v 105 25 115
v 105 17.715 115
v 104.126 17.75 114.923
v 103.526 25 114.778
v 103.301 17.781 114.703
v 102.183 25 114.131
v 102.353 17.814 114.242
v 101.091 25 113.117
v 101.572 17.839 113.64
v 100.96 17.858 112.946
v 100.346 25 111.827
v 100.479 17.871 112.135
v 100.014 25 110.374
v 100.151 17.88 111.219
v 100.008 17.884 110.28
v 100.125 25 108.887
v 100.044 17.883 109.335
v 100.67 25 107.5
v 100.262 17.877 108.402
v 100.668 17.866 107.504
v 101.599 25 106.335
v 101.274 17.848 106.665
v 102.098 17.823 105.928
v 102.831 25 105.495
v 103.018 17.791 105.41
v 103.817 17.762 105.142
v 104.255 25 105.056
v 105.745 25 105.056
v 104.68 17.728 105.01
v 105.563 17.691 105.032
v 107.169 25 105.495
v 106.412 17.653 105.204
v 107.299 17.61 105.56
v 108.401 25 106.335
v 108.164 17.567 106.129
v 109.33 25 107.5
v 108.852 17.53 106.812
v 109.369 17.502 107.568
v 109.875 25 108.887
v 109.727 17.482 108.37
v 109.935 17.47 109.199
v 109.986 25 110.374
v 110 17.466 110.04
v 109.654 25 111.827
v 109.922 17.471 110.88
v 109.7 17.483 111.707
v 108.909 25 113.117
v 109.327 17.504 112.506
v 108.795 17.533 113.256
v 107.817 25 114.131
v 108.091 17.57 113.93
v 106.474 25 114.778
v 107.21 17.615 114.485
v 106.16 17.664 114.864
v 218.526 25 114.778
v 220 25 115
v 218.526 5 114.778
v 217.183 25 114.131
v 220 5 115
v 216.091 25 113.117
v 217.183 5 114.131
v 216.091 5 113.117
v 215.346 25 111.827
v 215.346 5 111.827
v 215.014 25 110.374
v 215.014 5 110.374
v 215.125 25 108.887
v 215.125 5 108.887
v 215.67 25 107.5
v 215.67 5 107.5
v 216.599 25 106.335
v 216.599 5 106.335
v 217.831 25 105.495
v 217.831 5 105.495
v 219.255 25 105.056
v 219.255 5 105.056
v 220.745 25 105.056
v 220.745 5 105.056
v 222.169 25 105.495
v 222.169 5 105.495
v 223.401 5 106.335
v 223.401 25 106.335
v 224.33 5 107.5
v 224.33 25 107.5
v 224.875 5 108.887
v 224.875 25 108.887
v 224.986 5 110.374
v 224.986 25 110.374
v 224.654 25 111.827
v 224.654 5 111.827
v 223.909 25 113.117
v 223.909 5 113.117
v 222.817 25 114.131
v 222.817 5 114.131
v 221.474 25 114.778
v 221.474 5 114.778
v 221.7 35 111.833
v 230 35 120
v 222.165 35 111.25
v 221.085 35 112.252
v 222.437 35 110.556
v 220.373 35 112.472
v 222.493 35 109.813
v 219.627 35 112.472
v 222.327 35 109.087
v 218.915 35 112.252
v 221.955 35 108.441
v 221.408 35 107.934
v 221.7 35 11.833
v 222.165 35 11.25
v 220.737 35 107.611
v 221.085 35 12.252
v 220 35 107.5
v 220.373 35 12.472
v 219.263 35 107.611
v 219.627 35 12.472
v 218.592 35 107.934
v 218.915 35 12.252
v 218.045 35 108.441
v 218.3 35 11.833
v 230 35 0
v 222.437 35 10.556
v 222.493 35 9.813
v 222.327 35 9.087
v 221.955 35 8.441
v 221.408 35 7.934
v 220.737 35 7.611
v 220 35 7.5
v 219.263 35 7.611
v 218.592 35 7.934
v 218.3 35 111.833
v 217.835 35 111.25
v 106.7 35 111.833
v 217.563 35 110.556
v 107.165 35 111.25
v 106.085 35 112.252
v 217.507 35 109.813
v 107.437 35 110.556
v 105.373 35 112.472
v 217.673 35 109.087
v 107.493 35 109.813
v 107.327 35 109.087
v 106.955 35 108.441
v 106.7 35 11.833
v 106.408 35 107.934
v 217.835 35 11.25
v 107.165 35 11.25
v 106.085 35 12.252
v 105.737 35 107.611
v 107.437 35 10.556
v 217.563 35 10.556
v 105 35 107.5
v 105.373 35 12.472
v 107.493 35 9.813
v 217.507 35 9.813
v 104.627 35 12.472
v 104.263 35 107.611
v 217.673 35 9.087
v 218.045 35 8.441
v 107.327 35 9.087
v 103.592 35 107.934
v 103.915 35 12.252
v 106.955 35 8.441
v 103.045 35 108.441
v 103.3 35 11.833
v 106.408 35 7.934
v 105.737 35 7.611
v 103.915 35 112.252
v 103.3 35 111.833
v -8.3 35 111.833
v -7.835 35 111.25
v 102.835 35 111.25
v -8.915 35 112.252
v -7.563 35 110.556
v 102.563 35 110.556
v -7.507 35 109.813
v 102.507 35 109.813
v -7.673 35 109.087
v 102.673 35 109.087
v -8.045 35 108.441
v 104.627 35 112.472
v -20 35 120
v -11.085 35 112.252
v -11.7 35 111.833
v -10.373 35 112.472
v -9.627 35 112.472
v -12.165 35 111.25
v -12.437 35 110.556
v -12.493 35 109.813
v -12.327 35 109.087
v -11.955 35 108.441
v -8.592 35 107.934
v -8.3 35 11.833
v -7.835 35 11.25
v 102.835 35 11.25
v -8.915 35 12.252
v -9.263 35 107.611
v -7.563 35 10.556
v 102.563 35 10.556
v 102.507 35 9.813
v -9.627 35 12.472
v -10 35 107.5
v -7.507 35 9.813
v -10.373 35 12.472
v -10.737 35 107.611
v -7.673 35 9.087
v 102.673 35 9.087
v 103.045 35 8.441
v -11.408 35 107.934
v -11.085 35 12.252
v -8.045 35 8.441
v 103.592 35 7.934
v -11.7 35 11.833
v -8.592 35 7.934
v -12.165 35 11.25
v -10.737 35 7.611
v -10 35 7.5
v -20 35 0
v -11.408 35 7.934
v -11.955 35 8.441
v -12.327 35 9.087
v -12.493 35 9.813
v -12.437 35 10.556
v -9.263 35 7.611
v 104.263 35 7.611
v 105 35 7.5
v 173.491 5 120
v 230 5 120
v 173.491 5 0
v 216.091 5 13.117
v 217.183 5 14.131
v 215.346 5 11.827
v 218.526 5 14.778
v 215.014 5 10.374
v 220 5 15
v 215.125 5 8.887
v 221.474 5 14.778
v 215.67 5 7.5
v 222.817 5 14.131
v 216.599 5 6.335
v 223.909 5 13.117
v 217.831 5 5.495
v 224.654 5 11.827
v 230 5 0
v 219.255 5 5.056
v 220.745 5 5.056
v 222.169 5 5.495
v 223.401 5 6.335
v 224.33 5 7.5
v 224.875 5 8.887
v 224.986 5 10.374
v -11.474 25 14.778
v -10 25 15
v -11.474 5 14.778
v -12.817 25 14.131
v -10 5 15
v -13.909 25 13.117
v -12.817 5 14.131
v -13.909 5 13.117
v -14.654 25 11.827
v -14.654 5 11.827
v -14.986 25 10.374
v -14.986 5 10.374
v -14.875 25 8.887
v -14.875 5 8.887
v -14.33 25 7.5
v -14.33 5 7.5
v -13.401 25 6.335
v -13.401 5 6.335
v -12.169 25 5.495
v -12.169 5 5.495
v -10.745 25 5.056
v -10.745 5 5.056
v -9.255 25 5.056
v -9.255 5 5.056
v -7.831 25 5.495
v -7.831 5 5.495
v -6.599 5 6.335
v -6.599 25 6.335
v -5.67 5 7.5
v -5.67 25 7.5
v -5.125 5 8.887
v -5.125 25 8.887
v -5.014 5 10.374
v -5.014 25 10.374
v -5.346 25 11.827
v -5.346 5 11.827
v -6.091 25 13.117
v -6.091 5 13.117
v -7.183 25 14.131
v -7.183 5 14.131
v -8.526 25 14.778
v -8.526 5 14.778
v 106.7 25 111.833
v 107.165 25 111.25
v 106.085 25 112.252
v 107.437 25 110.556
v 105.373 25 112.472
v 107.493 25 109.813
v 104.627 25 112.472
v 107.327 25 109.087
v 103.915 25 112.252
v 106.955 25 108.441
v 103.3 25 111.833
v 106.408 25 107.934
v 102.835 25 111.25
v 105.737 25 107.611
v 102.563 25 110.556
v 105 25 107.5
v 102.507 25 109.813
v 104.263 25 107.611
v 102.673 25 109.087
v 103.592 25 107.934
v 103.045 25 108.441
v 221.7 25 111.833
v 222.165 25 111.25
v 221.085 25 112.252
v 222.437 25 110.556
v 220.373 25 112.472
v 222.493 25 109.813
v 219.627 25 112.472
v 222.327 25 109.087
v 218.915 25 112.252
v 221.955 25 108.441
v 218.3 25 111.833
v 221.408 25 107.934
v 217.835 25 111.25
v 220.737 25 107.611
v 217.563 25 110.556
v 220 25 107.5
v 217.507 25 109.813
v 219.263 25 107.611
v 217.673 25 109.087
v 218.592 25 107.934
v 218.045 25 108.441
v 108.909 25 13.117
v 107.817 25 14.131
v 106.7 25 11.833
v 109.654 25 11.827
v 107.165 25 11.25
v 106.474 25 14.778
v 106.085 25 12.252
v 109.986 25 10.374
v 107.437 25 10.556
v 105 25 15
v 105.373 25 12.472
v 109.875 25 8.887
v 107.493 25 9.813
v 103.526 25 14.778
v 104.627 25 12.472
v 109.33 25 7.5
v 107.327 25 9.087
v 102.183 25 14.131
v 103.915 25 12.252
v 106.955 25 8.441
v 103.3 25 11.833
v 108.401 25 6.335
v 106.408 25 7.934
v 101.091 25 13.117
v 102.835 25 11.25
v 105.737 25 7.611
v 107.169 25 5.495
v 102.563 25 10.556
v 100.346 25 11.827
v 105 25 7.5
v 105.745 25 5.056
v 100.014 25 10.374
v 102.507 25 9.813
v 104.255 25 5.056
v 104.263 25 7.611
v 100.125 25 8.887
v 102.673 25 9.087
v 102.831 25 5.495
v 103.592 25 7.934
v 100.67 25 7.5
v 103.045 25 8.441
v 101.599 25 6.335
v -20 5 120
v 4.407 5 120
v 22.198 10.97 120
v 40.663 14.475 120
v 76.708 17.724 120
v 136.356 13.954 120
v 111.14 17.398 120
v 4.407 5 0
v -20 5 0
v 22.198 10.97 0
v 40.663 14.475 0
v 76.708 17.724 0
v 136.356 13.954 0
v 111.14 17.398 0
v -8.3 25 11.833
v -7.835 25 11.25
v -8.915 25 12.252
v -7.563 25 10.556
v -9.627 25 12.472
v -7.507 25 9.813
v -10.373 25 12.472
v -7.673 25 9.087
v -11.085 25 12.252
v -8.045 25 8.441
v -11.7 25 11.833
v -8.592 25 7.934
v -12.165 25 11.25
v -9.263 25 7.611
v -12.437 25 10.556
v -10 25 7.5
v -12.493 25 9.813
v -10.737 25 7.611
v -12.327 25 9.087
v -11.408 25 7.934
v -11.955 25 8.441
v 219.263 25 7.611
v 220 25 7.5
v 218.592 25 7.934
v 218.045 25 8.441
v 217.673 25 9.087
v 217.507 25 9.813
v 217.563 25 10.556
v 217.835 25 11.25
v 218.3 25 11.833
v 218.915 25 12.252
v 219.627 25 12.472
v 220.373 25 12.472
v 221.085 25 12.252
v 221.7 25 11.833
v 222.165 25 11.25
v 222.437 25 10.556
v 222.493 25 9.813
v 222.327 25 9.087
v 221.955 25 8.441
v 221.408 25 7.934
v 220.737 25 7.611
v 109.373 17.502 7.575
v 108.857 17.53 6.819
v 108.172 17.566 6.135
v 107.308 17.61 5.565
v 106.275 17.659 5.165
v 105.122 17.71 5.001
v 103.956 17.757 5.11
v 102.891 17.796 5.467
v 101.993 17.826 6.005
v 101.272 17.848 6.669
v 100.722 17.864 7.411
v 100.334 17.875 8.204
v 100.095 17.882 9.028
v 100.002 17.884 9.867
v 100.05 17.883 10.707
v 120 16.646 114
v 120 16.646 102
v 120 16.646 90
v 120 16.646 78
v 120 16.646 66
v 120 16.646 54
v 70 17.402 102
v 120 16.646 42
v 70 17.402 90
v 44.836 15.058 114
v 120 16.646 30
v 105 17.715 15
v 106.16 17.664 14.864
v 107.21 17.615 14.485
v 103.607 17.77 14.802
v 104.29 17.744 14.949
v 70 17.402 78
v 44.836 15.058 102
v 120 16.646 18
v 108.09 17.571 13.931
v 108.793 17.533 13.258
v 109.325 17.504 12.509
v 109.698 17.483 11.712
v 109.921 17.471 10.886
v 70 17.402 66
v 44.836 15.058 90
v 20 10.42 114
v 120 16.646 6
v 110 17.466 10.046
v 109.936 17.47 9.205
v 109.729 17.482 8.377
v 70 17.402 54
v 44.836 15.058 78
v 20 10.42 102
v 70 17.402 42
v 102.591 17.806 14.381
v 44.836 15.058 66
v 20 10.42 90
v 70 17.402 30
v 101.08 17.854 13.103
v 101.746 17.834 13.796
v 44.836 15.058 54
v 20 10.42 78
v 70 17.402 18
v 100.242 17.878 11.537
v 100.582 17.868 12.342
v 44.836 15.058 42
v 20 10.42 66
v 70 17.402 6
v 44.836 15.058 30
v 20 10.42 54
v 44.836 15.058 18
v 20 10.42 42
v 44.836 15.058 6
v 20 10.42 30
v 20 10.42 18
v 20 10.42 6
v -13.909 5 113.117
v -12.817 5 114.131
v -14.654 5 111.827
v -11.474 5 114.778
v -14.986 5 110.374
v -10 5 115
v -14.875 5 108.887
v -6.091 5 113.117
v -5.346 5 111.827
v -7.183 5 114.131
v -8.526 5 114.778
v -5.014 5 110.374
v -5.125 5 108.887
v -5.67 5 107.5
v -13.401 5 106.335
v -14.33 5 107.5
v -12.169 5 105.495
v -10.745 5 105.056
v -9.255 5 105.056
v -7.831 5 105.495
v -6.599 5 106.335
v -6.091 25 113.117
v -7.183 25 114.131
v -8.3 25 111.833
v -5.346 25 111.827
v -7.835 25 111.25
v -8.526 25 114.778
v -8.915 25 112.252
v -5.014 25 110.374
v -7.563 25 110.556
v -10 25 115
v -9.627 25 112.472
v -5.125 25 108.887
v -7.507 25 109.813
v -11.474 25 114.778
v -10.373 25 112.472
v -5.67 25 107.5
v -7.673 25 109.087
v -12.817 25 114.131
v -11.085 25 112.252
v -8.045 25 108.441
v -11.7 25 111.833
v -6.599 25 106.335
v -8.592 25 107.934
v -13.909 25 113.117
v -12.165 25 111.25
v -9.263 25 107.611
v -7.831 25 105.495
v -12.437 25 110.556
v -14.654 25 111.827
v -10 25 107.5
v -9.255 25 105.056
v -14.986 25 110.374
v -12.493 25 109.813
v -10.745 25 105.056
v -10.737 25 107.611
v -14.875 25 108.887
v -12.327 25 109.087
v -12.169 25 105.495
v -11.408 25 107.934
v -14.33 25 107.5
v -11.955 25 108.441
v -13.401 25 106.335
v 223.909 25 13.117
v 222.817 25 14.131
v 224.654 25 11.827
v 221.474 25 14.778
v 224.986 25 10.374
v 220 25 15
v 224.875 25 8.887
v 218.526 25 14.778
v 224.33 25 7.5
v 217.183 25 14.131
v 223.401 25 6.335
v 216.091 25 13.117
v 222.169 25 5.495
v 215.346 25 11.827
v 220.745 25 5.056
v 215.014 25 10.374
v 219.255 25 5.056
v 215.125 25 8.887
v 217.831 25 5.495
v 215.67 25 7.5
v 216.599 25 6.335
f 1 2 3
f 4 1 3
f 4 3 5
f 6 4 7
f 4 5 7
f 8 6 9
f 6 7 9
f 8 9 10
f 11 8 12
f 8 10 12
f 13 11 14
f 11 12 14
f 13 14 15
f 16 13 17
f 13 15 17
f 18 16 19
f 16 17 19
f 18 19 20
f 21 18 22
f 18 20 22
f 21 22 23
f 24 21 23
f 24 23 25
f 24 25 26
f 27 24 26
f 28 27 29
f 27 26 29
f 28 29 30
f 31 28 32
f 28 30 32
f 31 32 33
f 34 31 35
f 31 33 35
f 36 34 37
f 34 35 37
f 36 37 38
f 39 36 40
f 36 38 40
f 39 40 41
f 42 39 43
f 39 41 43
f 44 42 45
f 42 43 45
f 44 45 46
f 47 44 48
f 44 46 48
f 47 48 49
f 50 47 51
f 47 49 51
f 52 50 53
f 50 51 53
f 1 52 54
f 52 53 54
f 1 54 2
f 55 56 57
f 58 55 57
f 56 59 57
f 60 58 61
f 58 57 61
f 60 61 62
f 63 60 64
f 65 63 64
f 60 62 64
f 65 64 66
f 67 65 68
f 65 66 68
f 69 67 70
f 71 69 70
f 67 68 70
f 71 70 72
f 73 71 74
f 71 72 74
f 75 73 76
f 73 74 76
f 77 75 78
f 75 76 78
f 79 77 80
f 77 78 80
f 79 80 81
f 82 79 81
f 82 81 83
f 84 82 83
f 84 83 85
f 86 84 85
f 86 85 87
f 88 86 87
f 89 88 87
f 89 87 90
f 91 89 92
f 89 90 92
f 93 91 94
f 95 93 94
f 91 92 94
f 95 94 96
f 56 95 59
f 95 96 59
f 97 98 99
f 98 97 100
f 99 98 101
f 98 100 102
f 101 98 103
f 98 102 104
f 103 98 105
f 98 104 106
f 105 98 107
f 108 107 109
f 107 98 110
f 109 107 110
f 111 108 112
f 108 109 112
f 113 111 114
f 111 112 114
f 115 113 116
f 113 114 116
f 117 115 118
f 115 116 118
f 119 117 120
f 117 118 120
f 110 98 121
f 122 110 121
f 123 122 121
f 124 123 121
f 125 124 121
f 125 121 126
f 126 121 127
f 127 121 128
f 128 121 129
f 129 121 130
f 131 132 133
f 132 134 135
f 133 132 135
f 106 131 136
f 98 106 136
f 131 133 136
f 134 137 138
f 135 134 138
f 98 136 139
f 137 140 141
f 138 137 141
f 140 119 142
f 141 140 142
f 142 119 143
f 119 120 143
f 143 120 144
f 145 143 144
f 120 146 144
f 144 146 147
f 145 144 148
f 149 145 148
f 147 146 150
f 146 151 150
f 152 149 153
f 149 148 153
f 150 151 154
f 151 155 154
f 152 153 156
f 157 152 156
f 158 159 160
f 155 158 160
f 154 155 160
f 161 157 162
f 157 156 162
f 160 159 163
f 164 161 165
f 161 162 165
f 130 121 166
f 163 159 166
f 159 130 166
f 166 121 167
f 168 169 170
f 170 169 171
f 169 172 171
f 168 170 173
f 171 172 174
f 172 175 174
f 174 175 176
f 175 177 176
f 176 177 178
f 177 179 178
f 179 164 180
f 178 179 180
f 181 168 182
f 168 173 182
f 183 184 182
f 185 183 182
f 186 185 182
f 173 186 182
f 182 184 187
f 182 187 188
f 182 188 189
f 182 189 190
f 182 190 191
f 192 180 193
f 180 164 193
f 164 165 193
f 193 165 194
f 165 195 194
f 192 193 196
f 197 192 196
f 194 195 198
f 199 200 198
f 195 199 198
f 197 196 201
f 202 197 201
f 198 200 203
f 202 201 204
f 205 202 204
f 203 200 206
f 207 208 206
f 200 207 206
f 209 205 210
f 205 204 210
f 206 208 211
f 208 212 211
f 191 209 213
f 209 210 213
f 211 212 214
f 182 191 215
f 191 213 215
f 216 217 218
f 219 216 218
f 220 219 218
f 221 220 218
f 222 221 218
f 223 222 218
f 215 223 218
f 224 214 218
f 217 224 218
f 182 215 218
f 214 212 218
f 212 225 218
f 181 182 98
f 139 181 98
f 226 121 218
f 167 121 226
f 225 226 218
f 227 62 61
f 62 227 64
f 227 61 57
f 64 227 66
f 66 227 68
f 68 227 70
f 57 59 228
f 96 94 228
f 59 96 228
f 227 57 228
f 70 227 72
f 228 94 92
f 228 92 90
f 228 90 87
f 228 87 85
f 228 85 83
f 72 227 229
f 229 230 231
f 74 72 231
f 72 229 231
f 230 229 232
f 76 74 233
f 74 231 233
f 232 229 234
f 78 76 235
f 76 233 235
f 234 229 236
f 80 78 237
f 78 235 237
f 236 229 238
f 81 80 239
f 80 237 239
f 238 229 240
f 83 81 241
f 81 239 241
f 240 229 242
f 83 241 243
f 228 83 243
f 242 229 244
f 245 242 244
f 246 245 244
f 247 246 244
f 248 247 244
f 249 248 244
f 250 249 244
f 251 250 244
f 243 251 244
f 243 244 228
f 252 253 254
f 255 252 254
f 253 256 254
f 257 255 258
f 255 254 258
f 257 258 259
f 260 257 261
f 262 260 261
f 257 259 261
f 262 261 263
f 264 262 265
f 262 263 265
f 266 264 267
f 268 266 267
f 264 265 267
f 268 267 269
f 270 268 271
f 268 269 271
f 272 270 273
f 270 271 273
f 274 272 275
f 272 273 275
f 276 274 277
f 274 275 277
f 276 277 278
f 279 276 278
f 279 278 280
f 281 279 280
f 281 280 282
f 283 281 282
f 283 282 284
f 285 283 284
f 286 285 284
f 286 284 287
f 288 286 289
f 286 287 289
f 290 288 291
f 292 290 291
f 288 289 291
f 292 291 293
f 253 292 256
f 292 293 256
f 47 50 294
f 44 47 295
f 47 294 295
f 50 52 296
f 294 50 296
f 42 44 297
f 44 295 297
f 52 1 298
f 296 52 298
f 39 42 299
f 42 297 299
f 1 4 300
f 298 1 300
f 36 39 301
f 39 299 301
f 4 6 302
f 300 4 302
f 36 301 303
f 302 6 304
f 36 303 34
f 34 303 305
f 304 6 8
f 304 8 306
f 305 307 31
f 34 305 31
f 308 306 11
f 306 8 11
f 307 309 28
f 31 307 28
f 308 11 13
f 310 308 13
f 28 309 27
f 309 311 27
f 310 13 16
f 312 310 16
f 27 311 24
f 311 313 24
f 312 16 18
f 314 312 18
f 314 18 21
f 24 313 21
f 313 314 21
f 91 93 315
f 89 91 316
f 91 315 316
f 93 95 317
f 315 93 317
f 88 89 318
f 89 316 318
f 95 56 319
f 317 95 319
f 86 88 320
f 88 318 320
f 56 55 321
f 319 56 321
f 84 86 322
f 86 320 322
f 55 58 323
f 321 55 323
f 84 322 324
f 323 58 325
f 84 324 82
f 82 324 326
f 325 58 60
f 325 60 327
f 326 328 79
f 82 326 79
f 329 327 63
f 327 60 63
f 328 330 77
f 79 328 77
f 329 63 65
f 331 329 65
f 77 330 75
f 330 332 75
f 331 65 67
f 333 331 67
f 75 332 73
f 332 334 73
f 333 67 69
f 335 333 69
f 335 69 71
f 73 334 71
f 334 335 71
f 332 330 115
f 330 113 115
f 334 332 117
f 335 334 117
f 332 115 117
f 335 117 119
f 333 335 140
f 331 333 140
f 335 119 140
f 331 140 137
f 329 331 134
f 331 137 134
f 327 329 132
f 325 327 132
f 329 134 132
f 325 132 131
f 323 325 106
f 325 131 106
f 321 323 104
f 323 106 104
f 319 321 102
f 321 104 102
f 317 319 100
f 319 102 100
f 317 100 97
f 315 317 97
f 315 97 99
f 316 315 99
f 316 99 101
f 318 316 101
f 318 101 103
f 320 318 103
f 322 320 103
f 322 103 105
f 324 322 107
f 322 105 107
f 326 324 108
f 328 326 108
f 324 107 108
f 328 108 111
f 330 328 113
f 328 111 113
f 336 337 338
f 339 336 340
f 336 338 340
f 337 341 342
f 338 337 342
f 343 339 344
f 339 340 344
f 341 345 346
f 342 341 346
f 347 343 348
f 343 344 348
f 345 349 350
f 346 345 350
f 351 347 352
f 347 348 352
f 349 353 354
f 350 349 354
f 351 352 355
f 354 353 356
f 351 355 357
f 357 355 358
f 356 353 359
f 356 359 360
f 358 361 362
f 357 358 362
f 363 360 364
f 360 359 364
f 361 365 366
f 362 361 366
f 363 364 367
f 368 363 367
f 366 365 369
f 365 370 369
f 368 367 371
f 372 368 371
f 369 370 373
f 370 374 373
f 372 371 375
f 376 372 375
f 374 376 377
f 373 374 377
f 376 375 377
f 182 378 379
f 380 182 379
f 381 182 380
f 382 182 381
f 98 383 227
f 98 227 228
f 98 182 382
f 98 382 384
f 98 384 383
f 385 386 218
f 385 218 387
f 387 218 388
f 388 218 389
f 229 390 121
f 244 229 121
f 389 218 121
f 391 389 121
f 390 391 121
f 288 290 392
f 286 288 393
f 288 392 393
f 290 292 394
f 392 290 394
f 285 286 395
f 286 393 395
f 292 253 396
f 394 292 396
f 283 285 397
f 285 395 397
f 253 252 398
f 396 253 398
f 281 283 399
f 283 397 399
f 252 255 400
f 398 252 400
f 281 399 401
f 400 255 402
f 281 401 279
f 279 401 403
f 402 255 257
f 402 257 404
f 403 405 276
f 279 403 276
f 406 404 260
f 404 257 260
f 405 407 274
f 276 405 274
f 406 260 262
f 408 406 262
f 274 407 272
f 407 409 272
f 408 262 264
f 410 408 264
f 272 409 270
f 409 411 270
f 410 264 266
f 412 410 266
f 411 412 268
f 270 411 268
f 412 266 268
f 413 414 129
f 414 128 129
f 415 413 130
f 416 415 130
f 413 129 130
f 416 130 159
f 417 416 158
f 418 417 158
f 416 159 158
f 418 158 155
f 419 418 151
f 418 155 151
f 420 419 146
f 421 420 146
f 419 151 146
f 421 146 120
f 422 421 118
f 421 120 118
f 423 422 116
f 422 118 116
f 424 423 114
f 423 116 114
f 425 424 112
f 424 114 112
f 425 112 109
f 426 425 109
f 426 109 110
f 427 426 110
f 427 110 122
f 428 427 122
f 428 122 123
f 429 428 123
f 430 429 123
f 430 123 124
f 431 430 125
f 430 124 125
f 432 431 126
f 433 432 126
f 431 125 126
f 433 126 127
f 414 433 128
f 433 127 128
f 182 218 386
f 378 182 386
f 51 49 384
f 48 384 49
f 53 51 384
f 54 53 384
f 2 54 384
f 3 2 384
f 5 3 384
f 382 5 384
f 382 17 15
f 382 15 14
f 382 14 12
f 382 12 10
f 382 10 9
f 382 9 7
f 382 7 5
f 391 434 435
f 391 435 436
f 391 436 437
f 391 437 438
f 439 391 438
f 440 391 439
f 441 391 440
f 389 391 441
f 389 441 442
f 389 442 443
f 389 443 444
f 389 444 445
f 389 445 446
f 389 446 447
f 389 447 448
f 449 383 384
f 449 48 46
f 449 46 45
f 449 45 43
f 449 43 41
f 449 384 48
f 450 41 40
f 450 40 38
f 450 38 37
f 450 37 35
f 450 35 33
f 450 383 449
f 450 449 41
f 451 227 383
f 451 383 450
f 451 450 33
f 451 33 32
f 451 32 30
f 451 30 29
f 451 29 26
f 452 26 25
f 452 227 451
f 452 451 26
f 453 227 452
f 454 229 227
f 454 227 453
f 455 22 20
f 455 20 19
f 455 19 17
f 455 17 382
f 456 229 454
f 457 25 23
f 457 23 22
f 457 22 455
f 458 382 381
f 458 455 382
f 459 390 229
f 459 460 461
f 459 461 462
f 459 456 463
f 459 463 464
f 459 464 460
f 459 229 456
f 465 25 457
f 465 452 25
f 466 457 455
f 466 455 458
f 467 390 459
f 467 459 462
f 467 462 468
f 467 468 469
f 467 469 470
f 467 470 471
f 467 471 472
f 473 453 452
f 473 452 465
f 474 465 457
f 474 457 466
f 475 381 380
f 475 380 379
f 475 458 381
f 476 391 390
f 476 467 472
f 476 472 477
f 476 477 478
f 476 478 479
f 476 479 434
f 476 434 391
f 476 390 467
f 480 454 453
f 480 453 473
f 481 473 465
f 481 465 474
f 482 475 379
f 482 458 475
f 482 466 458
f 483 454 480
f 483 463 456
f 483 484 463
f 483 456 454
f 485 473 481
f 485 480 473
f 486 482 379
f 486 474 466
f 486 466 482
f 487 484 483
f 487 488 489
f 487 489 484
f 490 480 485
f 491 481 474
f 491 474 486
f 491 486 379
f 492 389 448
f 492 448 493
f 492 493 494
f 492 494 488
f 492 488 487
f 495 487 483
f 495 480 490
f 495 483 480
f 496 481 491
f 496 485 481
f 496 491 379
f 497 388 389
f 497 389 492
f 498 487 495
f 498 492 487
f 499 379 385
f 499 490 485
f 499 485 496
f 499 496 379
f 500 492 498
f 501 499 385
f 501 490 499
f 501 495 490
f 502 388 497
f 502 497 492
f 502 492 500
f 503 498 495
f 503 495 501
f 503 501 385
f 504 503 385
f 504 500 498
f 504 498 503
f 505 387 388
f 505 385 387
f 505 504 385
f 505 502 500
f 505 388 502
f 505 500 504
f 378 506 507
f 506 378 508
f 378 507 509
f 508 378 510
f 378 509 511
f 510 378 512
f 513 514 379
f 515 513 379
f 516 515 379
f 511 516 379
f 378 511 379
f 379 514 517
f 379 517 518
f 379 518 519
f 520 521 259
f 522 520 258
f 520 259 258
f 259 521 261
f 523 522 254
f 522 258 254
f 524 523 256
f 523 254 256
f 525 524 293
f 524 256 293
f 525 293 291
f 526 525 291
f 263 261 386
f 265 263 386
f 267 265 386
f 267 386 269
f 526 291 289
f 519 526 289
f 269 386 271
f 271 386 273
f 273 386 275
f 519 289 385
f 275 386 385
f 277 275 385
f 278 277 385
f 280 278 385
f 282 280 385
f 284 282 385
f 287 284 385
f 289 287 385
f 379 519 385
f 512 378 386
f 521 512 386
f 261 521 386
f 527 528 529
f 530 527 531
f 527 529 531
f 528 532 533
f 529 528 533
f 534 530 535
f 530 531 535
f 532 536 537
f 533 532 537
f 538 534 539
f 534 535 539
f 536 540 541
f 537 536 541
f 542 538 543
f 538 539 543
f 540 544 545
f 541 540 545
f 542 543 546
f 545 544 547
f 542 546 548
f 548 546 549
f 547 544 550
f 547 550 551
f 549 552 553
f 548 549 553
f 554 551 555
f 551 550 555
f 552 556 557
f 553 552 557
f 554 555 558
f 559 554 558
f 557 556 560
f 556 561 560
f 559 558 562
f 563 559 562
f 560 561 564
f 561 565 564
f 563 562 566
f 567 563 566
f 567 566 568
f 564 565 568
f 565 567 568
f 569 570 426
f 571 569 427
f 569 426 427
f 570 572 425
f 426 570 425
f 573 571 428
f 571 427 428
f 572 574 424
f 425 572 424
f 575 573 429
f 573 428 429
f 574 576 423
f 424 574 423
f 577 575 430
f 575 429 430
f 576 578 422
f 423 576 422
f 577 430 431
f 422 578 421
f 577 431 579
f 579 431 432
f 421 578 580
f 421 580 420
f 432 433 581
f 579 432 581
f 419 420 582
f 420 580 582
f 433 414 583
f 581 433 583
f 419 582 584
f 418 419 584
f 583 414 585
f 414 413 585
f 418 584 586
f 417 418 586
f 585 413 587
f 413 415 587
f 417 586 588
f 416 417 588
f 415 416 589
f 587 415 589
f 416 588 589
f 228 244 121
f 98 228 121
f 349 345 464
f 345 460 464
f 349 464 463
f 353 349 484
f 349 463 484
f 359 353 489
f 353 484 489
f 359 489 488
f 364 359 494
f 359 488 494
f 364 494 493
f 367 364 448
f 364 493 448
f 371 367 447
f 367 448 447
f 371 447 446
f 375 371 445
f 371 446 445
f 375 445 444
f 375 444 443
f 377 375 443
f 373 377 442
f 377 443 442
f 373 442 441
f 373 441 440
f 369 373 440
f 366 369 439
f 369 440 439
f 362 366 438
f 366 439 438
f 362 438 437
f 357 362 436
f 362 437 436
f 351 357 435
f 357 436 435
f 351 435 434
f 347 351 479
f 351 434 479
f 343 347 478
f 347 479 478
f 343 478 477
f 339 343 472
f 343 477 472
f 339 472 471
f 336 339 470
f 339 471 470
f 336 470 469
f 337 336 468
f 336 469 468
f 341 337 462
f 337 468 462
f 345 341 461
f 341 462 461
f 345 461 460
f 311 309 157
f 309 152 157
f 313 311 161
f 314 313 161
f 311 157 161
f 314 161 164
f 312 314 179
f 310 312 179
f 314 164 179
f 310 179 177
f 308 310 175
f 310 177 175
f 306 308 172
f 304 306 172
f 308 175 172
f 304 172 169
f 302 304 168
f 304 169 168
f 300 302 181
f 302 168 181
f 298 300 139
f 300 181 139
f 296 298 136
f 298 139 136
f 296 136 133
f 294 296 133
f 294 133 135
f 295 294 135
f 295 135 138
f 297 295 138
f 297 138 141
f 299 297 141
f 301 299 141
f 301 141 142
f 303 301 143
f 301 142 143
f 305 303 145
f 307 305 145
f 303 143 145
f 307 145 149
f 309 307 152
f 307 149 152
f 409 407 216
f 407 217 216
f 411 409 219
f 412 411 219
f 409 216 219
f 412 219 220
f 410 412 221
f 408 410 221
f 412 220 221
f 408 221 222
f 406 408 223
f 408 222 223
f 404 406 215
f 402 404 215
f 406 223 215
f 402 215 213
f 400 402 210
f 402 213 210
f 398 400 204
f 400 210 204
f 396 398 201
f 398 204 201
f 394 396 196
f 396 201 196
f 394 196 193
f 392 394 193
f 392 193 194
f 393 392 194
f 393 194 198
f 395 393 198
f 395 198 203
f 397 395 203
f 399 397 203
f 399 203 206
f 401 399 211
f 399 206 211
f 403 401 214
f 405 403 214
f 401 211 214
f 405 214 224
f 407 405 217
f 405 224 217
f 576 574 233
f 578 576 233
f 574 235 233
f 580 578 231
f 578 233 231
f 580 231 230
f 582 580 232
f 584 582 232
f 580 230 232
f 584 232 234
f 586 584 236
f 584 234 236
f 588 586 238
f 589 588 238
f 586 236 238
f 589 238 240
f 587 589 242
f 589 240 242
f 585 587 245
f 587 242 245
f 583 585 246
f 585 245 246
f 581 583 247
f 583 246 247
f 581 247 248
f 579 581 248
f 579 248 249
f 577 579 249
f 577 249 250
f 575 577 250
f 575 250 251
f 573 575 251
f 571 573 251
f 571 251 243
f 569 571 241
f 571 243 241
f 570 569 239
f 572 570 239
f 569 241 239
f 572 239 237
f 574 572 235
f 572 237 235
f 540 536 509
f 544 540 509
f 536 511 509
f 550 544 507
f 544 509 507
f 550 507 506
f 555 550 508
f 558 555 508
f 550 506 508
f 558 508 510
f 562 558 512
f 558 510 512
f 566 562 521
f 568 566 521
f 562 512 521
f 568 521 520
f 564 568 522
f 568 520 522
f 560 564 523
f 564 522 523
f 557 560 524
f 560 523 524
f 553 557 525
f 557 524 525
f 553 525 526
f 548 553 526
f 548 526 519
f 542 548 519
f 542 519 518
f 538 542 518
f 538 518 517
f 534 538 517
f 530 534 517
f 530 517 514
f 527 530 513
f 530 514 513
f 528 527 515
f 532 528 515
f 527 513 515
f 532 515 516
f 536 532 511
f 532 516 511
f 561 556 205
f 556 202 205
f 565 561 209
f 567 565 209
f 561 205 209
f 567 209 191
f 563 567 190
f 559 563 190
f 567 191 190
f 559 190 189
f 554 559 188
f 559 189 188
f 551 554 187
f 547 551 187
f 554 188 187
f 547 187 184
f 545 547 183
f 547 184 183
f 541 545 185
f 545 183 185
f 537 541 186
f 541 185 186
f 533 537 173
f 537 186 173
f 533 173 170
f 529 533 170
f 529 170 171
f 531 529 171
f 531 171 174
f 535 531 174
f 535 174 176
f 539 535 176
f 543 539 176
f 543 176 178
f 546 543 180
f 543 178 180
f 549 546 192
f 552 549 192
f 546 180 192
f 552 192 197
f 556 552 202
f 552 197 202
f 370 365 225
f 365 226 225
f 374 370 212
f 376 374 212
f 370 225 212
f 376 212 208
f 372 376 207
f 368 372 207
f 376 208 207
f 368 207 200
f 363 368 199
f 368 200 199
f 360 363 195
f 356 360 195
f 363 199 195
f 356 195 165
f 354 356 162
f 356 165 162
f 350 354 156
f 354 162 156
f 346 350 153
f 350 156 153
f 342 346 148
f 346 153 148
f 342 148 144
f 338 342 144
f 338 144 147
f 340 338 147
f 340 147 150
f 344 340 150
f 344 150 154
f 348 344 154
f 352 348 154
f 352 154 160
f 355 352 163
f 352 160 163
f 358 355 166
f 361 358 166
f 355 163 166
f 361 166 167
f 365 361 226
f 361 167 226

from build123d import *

# Parameters (mm, degrees)
BOSS_EXTRUDE1_DEPTH             = 120
SKETCH10_W                      = 2.5
SKETCH10_H                      = 10
F_5_0MM_DOWEL_HOLE1_AT_2_COUNT  = 2
F_5_0MM_DOWEL_HOLE1_AT_2_PITCH  = 230
F_5_0MM_DOWEL_HOLE1_AT_3_COUNT  = 2
F_5_0MM_DOWEL_HOLE1_AT_3_PITCH  = 250.79872408
F_5_0MM_DOWEL_HOLE1_AT_4_COUNT  = 2
F_5_0MM_DOWEL_HOLE1_AT_4_PITCH  = 152.397506541
F_5_0MM_DOWEL_HOLE1_AT_5_COUNT  = 2
F_5_0MM_DOWEL_HOLE1_AT_5_PITCH  = 100
F_5_0MM_DOWEL_HOLE1_AT_6_COUNT  = 2
F_5_0MM_DOWEL_HOLE1_AT_6_PITCH  = 115
SKETCH13_W                      = 5
SKETCH13_H                      = 20
F_10_0MM_DOWEL_HOLE1_AT_2_COUNT = 2
F_10_0MM_DOWEL_HOLE1_AT_2_PITCH = 115
F_10_0MM_DOWEL_HOLE1_AT_3_COUNT = 2
F_10_0MM_DOWEL_HOLE1_AT_3_PITCH = 230
F_10_0MM_DOWEL_HOLE1_AT_4_COUNT = 2
F_10_0MM_DOWEL_HOLE1_AT_4_PITCH = 250.79872408
F_10_0MM_DOWEL_HOLE1_AT_5_COUNT = 2
F_10_0MM_DOWEL_HOLE1_AT_5_PITCH = 152.397506541
F_10_0MM_DOWEL_HOLE1_AT_6_COUNT = 2
F_10_0MM_DOWEL_HOLE1_AT_6_PITCH = 100


with BuildPart() as part:
    # Sketch1 → Boss-Extrude1 (new body)
    with BuildSketch(Plane.XY):
        with BuildLine():
            Line((-20, 5), (4.406999064, 5))
            add(Edge.make_bspline(
                [(173.490575932, 5), (172.326342066, 5.286749118), (167.829693344, 6.405018282), (160.005568623, 8.421384221), (150.022959876, 10.929293239), (140.032690883, 13.242212873), (130.039576349, 15.224534417), (120.039677674, 16.776832577), (110.010328484, 17.519452934), (100.004268105, 17.93606864), (89.999557234, 18.039439262), (79.99597078, 17.88209955), (69.992122817, 17.447369698), (59.98803219, 16.737630926), (49.981633888, 15.747713143), (39.97167458, 14.434248174), (29.95037961, 12.743709227), (21.617032213, 10.901524907), (14.966560888, 9.053828582), (9.928778454, 7.425562721), (6.425978449, 5.993531691), (4.603660534, 5.099329751), (4.406999064, 5)],
                knots=[0.065553478, 0.065553478, 0.065553478, 0.065553478, 0.074294227, 0.099342978, 0.124359733, 0.149264719, 0.174009696, 0.198546974, 0.22290397, 0.247200686, 0.271477726, 0.295756352, 0.320054721, 0.344391349, 0.368786978, 0.393273071, 0.417900952, 0.442781229, 0.455381891, 0.468160436, 0.481314037, 0.482916031, 0.482916031, 0.482916031, 0.482916031], degree=3))
            Line((173.490575932, 5), (230, 5))
            Line((230, 5), (230, 35))
            Line((230, 35), (-20, 35))
            Line((-20, 35), (-20, 5))
        make_face()
    extrude(amount=BOSS_EXTRUDE1_DEPTH)

    # Sketch10 → Ø5.0mm Dowel Hole1 (revolve, cut)
    with BuildSketch(Plane(origin=(-10, 25, 10), x_dir=(0, 0, -1), z_dir=(1, 0, 0))):
        with Locations((1.25, 5)):
            Rectangle(SKETCH10_W, SKETCH10_H)
    f_5_0mm_dowel_hole1 = revolve(axis=Axis((-10, 18.65, 10), (0, 1, 0)), mode=Mode.SUBTRACT)

    # Ø5.0mm Dowel Hole1 at 2: Ø5.0mm Dowel Hole1 ×2
    with Locations(*[(i * F_5_0MM_DOWEL_HOLE1_AT_2_PITCH, 0, 0) for i in range(1, F_5_0MM_DOWEL_HOLE1_AT_2_COUNT)]):
        add(f_5_0mm_dowel_hole1, mode=Mode.SUBTRACT)

    # Ø5.0mm Dowel Hole1 at 3: Ø5.0mm Dowel Hole1 ×2
    with Locations(*[Vector(0.917070056253235, 0, 0.39872611141445) * (i * F_5_0MM_DOWEL_HOLE1_AT_3_PITCH) for i in range(1, F_5_0MM_DOWEL_HOLE1_AT_3_COUNT)]):
        add(f_5_0mm_dowel_hole1, mode=Mode.SUBTRACT)

    # Ø5.0mm Dowel Hole1 at 4: Ø5.0mm Dowel Hole1 ×2
    with Locations(*[Vector(0.7546055221635047, 0, 0.6561787149247866) * (i * F_5_0MM_DOWEL_HOLE1_AT_4_PITCH) for i in range(1, F_5_0MM_DOWEL_HOLE1_AT_4_COUNT)]):
        add(f_5_0mm_dowel_hole1, mode=Mode.SUBTRACT)

    # Ø5.0mm Dowel Hole1 at 5: Ø5.0mm Dowel Hole1 ×2
    with Locations(*[(0, 0, i * F_5_0MM_DOWEL_HOLE1_AT_5_PITCH) for i in range(1, F_5_0MM_DOWEL_HOLE1_AT_5_COUNT)]):
        add(f_5_0mm_dowel_hole1, mode=Mode.SUBTRACT)

    # Ø5.0mm Dowel Hole1 at 6: Ø5.0mm Dowel Hole1 ×2
    with Locations(*[(i * F_5_0MM_DOWEL_HOLE1_AT_6_PITCH, 0, 0) for i in range(1, F_5_0MM_DOWEL_HOLE1_AT_6_COUNT)]):
        add(f_5_0mm_dowel_hole1, mode=Mode.SUBTRACT)

    # Sketch13 → Ø10.0mm Dowel Hole1 (revolve, cut)
    with BuildSketch(Plane(origin=(-10, 25, 10), x_dir=(0, 0, 1), z_dir=(1, 0, 0))):
        with Locations((2.5, 10)):
            Rectangle(SKETCH13_W, SKETCH13_H)
    f_10_0mm_dowel_hole1 = revolve(axis=Axis((-10, 31.35, 10), (0, -1, 0)), mode=Mode.SUBTRACT)

    # Ø10.0mm Dowel Hole1 at 2: Ø10.0mm Dowel Hole1 ×2
    with Locations(*[(i * F_10_0MM_DOWEL_HOLE1_AT_2_PITCH, 0, 0) for i in range(1, F_10_0MM_DOWEL_HOLE1_AT_2_COUNT)]):
        add(f_10_0mm_dowel_hole1, mode=Mode.SUBTRACT)

    # Ø10.0mm Dowel Hole1 at 3: Ø10.0mm Dowel Hole1 ×2
    with Locations(*[(i * F_10_0MM_DOWEL_HOLE1_AT_3_PITCH, 0, 0) for i in range(1, F_10_0MM_DOWEL_HOLE1_AT_3_COUNT)]):
        add(f_10_0mm_dowel_hole1, mode=Mode.SUBTRACT)

    # Ø10.0mm Dowel Hole1 at 4: Ø10.0mm Dowel Hole1 ×2
    with Locations(*[Vector(0.917070056253235, 0, 0.39872611141445) * (i * F_10_0MM_DOWEL_HOLE1_AT_4_PITCH) for i in range(1, F_10_0MM_DOWEL_HOLE1_AT_4_COUNT)]):
        add(f_10_0mm_dowel_hole1, mode=Mode.SUBTRACT)

    # Ø10.0mm Dowel Hole1 at 5: Ø10.0mm Dowel Hole1 ×2
    with Locations(*[Vector(0.7546055221635047, 0, 0.6561787149247866) * (i * F_10_0MM_DOWEL_HOLE1_AT_5_PITCH) for i in range(1, F_10_0MM_DOWEL_HOLE1_AT_5_COUNT)]):
        add(f_10_0mm_dowel_hole1, mode=Mode.SUBTRACT)

    # Ø10.0mm Dowel Hole1 at 6: Ø10.0mm Dowel Hole1 ×2
    with Locations(*[(0, 0, i * F_10_0MM_DOWEL_HOLE1_AT_6_PITCH) for i in range(1, F_10_0MM_DOWEL_HOLE1_AT_6_COUNT)]):
        add(f_10_0mm_dowel_hole1, mode=Mode.SUBTRACT)


solid = part.part
